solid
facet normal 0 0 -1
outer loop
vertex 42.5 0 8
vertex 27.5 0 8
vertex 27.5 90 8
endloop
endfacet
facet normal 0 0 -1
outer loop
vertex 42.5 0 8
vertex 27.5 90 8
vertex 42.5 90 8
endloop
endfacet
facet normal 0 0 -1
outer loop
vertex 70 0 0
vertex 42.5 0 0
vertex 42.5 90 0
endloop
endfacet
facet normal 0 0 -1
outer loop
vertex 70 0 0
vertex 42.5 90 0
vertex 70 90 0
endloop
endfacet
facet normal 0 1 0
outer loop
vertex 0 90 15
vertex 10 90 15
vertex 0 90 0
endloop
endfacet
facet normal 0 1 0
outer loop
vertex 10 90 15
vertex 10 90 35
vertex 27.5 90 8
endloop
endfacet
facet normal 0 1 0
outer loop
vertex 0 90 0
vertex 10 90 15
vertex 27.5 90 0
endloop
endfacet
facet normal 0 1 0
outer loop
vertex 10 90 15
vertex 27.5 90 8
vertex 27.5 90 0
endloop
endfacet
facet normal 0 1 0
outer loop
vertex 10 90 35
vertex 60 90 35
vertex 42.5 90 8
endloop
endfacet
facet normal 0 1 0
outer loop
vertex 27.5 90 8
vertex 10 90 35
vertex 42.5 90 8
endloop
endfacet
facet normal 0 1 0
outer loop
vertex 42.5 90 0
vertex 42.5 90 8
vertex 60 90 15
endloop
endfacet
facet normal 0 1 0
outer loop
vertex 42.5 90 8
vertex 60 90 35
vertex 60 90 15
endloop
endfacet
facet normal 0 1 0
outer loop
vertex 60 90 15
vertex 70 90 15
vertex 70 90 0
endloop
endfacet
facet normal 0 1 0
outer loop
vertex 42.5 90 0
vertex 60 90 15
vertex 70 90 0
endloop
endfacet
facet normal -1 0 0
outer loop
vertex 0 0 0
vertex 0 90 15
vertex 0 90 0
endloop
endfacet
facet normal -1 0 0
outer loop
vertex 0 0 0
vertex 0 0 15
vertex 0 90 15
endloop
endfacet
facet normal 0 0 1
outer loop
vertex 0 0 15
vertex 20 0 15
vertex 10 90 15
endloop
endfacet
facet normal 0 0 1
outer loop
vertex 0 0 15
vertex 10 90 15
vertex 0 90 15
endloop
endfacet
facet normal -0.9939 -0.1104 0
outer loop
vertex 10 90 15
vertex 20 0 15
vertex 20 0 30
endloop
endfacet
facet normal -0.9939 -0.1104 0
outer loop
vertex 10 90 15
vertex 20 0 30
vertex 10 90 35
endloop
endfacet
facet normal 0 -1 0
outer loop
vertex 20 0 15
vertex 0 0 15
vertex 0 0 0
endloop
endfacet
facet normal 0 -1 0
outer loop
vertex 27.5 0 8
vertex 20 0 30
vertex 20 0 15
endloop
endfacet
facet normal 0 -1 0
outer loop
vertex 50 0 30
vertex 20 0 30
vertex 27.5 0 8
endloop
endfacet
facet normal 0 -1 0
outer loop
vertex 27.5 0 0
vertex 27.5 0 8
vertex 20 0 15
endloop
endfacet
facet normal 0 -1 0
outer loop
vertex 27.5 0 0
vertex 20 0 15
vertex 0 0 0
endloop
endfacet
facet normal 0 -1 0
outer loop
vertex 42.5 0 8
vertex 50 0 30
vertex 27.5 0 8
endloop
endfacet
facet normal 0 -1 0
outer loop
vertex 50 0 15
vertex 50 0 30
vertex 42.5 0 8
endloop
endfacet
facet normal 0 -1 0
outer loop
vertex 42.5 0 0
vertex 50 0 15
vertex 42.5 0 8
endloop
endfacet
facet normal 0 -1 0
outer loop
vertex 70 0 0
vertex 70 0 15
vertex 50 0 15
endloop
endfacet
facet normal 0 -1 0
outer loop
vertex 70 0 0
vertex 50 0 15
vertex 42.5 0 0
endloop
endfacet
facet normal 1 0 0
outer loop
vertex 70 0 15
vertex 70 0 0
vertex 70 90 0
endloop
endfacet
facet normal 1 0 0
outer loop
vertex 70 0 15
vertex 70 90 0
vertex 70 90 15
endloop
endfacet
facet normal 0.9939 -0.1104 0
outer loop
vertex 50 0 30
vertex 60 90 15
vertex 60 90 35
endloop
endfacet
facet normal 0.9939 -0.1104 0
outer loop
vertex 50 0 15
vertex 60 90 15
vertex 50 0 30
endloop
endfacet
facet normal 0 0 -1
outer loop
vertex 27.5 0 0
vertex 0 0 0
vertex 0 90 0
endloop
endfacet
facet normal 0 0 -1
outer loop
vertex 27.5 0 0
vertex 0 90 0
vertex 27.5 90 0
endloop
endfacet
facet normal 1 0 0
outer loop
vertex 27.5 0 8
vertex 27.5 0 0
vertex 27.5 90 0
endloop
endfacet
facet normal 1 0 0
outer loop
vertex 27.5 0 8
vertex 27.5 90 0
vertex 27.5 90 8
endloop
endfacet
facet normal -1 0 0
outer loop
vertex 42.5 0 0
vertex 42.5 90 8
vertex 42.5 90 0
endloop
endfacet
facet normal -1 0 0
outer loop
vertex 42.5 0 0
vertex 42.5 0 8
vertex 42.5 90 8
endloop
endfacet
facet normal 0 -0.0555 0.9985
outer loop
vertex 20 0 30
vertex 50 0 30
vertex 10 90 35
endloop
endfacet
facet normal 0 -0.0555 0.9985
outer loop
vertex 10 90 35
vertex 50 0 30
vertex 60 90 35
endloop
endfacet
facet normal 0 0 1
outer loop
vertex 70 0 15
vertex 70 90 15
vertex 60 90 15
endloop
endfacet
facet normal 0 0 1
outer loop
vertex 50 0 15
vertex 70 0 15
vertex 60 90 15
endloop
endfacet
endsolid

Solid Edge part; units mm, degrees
sketch "Sketch1" plane through (0, 0, 0) normal (0, -1, 0) x (1, 0, 0)
  line L0 (70, 15) -> (0, 15)
  line L1 (0, 15) -> (0, 0)
  line L2 (0, 0) -> (27.5, 0)
  line L3 (27.5, 0) -> (27.5, 8)
  line L4 (27.5, 8) -> (42.5, 8)
  line L5 (42.5, 8) -> (42.5, 0)
  line L6 (42.5, 0) -> (70, 0)
  line L7 (70, 0) -> (70, 15)
extrude "Protrusion1" add sketch "Sketch1" against normal blind 90
sketch "Sketch2" plane through (35, 45, 15) normal (0, 0, 1) x (1, 0, 0)
  line L0 (25, 45) -> (15, -45)
  line L1 (15, -45) -> (-15, -45)
  line L2 (-15, -45) -> (-25, 45)
  line L3 (-25, 45) -> (25, 45)
extrude "ExtrudedProtrusion_3" add sketch "Sketch2" along normal blind 20
extrude "Protrusion2" [suppressed]
sketch "Sketch3" plane through (70, 45, 17.5) normal (1, 0, 0) x (0, 1, 0)
  line L0 (-45, 17.5) -> (-45, 12.5)
  line L1 (-45, 12.5) -> (45, 17.5)
  line L2 (45, 17.5) -> (-45, 17.5)
extrude "ExtrudedCutout_2" cut sketch "Sketch3" against normal blind 76 and the other way blind 76
